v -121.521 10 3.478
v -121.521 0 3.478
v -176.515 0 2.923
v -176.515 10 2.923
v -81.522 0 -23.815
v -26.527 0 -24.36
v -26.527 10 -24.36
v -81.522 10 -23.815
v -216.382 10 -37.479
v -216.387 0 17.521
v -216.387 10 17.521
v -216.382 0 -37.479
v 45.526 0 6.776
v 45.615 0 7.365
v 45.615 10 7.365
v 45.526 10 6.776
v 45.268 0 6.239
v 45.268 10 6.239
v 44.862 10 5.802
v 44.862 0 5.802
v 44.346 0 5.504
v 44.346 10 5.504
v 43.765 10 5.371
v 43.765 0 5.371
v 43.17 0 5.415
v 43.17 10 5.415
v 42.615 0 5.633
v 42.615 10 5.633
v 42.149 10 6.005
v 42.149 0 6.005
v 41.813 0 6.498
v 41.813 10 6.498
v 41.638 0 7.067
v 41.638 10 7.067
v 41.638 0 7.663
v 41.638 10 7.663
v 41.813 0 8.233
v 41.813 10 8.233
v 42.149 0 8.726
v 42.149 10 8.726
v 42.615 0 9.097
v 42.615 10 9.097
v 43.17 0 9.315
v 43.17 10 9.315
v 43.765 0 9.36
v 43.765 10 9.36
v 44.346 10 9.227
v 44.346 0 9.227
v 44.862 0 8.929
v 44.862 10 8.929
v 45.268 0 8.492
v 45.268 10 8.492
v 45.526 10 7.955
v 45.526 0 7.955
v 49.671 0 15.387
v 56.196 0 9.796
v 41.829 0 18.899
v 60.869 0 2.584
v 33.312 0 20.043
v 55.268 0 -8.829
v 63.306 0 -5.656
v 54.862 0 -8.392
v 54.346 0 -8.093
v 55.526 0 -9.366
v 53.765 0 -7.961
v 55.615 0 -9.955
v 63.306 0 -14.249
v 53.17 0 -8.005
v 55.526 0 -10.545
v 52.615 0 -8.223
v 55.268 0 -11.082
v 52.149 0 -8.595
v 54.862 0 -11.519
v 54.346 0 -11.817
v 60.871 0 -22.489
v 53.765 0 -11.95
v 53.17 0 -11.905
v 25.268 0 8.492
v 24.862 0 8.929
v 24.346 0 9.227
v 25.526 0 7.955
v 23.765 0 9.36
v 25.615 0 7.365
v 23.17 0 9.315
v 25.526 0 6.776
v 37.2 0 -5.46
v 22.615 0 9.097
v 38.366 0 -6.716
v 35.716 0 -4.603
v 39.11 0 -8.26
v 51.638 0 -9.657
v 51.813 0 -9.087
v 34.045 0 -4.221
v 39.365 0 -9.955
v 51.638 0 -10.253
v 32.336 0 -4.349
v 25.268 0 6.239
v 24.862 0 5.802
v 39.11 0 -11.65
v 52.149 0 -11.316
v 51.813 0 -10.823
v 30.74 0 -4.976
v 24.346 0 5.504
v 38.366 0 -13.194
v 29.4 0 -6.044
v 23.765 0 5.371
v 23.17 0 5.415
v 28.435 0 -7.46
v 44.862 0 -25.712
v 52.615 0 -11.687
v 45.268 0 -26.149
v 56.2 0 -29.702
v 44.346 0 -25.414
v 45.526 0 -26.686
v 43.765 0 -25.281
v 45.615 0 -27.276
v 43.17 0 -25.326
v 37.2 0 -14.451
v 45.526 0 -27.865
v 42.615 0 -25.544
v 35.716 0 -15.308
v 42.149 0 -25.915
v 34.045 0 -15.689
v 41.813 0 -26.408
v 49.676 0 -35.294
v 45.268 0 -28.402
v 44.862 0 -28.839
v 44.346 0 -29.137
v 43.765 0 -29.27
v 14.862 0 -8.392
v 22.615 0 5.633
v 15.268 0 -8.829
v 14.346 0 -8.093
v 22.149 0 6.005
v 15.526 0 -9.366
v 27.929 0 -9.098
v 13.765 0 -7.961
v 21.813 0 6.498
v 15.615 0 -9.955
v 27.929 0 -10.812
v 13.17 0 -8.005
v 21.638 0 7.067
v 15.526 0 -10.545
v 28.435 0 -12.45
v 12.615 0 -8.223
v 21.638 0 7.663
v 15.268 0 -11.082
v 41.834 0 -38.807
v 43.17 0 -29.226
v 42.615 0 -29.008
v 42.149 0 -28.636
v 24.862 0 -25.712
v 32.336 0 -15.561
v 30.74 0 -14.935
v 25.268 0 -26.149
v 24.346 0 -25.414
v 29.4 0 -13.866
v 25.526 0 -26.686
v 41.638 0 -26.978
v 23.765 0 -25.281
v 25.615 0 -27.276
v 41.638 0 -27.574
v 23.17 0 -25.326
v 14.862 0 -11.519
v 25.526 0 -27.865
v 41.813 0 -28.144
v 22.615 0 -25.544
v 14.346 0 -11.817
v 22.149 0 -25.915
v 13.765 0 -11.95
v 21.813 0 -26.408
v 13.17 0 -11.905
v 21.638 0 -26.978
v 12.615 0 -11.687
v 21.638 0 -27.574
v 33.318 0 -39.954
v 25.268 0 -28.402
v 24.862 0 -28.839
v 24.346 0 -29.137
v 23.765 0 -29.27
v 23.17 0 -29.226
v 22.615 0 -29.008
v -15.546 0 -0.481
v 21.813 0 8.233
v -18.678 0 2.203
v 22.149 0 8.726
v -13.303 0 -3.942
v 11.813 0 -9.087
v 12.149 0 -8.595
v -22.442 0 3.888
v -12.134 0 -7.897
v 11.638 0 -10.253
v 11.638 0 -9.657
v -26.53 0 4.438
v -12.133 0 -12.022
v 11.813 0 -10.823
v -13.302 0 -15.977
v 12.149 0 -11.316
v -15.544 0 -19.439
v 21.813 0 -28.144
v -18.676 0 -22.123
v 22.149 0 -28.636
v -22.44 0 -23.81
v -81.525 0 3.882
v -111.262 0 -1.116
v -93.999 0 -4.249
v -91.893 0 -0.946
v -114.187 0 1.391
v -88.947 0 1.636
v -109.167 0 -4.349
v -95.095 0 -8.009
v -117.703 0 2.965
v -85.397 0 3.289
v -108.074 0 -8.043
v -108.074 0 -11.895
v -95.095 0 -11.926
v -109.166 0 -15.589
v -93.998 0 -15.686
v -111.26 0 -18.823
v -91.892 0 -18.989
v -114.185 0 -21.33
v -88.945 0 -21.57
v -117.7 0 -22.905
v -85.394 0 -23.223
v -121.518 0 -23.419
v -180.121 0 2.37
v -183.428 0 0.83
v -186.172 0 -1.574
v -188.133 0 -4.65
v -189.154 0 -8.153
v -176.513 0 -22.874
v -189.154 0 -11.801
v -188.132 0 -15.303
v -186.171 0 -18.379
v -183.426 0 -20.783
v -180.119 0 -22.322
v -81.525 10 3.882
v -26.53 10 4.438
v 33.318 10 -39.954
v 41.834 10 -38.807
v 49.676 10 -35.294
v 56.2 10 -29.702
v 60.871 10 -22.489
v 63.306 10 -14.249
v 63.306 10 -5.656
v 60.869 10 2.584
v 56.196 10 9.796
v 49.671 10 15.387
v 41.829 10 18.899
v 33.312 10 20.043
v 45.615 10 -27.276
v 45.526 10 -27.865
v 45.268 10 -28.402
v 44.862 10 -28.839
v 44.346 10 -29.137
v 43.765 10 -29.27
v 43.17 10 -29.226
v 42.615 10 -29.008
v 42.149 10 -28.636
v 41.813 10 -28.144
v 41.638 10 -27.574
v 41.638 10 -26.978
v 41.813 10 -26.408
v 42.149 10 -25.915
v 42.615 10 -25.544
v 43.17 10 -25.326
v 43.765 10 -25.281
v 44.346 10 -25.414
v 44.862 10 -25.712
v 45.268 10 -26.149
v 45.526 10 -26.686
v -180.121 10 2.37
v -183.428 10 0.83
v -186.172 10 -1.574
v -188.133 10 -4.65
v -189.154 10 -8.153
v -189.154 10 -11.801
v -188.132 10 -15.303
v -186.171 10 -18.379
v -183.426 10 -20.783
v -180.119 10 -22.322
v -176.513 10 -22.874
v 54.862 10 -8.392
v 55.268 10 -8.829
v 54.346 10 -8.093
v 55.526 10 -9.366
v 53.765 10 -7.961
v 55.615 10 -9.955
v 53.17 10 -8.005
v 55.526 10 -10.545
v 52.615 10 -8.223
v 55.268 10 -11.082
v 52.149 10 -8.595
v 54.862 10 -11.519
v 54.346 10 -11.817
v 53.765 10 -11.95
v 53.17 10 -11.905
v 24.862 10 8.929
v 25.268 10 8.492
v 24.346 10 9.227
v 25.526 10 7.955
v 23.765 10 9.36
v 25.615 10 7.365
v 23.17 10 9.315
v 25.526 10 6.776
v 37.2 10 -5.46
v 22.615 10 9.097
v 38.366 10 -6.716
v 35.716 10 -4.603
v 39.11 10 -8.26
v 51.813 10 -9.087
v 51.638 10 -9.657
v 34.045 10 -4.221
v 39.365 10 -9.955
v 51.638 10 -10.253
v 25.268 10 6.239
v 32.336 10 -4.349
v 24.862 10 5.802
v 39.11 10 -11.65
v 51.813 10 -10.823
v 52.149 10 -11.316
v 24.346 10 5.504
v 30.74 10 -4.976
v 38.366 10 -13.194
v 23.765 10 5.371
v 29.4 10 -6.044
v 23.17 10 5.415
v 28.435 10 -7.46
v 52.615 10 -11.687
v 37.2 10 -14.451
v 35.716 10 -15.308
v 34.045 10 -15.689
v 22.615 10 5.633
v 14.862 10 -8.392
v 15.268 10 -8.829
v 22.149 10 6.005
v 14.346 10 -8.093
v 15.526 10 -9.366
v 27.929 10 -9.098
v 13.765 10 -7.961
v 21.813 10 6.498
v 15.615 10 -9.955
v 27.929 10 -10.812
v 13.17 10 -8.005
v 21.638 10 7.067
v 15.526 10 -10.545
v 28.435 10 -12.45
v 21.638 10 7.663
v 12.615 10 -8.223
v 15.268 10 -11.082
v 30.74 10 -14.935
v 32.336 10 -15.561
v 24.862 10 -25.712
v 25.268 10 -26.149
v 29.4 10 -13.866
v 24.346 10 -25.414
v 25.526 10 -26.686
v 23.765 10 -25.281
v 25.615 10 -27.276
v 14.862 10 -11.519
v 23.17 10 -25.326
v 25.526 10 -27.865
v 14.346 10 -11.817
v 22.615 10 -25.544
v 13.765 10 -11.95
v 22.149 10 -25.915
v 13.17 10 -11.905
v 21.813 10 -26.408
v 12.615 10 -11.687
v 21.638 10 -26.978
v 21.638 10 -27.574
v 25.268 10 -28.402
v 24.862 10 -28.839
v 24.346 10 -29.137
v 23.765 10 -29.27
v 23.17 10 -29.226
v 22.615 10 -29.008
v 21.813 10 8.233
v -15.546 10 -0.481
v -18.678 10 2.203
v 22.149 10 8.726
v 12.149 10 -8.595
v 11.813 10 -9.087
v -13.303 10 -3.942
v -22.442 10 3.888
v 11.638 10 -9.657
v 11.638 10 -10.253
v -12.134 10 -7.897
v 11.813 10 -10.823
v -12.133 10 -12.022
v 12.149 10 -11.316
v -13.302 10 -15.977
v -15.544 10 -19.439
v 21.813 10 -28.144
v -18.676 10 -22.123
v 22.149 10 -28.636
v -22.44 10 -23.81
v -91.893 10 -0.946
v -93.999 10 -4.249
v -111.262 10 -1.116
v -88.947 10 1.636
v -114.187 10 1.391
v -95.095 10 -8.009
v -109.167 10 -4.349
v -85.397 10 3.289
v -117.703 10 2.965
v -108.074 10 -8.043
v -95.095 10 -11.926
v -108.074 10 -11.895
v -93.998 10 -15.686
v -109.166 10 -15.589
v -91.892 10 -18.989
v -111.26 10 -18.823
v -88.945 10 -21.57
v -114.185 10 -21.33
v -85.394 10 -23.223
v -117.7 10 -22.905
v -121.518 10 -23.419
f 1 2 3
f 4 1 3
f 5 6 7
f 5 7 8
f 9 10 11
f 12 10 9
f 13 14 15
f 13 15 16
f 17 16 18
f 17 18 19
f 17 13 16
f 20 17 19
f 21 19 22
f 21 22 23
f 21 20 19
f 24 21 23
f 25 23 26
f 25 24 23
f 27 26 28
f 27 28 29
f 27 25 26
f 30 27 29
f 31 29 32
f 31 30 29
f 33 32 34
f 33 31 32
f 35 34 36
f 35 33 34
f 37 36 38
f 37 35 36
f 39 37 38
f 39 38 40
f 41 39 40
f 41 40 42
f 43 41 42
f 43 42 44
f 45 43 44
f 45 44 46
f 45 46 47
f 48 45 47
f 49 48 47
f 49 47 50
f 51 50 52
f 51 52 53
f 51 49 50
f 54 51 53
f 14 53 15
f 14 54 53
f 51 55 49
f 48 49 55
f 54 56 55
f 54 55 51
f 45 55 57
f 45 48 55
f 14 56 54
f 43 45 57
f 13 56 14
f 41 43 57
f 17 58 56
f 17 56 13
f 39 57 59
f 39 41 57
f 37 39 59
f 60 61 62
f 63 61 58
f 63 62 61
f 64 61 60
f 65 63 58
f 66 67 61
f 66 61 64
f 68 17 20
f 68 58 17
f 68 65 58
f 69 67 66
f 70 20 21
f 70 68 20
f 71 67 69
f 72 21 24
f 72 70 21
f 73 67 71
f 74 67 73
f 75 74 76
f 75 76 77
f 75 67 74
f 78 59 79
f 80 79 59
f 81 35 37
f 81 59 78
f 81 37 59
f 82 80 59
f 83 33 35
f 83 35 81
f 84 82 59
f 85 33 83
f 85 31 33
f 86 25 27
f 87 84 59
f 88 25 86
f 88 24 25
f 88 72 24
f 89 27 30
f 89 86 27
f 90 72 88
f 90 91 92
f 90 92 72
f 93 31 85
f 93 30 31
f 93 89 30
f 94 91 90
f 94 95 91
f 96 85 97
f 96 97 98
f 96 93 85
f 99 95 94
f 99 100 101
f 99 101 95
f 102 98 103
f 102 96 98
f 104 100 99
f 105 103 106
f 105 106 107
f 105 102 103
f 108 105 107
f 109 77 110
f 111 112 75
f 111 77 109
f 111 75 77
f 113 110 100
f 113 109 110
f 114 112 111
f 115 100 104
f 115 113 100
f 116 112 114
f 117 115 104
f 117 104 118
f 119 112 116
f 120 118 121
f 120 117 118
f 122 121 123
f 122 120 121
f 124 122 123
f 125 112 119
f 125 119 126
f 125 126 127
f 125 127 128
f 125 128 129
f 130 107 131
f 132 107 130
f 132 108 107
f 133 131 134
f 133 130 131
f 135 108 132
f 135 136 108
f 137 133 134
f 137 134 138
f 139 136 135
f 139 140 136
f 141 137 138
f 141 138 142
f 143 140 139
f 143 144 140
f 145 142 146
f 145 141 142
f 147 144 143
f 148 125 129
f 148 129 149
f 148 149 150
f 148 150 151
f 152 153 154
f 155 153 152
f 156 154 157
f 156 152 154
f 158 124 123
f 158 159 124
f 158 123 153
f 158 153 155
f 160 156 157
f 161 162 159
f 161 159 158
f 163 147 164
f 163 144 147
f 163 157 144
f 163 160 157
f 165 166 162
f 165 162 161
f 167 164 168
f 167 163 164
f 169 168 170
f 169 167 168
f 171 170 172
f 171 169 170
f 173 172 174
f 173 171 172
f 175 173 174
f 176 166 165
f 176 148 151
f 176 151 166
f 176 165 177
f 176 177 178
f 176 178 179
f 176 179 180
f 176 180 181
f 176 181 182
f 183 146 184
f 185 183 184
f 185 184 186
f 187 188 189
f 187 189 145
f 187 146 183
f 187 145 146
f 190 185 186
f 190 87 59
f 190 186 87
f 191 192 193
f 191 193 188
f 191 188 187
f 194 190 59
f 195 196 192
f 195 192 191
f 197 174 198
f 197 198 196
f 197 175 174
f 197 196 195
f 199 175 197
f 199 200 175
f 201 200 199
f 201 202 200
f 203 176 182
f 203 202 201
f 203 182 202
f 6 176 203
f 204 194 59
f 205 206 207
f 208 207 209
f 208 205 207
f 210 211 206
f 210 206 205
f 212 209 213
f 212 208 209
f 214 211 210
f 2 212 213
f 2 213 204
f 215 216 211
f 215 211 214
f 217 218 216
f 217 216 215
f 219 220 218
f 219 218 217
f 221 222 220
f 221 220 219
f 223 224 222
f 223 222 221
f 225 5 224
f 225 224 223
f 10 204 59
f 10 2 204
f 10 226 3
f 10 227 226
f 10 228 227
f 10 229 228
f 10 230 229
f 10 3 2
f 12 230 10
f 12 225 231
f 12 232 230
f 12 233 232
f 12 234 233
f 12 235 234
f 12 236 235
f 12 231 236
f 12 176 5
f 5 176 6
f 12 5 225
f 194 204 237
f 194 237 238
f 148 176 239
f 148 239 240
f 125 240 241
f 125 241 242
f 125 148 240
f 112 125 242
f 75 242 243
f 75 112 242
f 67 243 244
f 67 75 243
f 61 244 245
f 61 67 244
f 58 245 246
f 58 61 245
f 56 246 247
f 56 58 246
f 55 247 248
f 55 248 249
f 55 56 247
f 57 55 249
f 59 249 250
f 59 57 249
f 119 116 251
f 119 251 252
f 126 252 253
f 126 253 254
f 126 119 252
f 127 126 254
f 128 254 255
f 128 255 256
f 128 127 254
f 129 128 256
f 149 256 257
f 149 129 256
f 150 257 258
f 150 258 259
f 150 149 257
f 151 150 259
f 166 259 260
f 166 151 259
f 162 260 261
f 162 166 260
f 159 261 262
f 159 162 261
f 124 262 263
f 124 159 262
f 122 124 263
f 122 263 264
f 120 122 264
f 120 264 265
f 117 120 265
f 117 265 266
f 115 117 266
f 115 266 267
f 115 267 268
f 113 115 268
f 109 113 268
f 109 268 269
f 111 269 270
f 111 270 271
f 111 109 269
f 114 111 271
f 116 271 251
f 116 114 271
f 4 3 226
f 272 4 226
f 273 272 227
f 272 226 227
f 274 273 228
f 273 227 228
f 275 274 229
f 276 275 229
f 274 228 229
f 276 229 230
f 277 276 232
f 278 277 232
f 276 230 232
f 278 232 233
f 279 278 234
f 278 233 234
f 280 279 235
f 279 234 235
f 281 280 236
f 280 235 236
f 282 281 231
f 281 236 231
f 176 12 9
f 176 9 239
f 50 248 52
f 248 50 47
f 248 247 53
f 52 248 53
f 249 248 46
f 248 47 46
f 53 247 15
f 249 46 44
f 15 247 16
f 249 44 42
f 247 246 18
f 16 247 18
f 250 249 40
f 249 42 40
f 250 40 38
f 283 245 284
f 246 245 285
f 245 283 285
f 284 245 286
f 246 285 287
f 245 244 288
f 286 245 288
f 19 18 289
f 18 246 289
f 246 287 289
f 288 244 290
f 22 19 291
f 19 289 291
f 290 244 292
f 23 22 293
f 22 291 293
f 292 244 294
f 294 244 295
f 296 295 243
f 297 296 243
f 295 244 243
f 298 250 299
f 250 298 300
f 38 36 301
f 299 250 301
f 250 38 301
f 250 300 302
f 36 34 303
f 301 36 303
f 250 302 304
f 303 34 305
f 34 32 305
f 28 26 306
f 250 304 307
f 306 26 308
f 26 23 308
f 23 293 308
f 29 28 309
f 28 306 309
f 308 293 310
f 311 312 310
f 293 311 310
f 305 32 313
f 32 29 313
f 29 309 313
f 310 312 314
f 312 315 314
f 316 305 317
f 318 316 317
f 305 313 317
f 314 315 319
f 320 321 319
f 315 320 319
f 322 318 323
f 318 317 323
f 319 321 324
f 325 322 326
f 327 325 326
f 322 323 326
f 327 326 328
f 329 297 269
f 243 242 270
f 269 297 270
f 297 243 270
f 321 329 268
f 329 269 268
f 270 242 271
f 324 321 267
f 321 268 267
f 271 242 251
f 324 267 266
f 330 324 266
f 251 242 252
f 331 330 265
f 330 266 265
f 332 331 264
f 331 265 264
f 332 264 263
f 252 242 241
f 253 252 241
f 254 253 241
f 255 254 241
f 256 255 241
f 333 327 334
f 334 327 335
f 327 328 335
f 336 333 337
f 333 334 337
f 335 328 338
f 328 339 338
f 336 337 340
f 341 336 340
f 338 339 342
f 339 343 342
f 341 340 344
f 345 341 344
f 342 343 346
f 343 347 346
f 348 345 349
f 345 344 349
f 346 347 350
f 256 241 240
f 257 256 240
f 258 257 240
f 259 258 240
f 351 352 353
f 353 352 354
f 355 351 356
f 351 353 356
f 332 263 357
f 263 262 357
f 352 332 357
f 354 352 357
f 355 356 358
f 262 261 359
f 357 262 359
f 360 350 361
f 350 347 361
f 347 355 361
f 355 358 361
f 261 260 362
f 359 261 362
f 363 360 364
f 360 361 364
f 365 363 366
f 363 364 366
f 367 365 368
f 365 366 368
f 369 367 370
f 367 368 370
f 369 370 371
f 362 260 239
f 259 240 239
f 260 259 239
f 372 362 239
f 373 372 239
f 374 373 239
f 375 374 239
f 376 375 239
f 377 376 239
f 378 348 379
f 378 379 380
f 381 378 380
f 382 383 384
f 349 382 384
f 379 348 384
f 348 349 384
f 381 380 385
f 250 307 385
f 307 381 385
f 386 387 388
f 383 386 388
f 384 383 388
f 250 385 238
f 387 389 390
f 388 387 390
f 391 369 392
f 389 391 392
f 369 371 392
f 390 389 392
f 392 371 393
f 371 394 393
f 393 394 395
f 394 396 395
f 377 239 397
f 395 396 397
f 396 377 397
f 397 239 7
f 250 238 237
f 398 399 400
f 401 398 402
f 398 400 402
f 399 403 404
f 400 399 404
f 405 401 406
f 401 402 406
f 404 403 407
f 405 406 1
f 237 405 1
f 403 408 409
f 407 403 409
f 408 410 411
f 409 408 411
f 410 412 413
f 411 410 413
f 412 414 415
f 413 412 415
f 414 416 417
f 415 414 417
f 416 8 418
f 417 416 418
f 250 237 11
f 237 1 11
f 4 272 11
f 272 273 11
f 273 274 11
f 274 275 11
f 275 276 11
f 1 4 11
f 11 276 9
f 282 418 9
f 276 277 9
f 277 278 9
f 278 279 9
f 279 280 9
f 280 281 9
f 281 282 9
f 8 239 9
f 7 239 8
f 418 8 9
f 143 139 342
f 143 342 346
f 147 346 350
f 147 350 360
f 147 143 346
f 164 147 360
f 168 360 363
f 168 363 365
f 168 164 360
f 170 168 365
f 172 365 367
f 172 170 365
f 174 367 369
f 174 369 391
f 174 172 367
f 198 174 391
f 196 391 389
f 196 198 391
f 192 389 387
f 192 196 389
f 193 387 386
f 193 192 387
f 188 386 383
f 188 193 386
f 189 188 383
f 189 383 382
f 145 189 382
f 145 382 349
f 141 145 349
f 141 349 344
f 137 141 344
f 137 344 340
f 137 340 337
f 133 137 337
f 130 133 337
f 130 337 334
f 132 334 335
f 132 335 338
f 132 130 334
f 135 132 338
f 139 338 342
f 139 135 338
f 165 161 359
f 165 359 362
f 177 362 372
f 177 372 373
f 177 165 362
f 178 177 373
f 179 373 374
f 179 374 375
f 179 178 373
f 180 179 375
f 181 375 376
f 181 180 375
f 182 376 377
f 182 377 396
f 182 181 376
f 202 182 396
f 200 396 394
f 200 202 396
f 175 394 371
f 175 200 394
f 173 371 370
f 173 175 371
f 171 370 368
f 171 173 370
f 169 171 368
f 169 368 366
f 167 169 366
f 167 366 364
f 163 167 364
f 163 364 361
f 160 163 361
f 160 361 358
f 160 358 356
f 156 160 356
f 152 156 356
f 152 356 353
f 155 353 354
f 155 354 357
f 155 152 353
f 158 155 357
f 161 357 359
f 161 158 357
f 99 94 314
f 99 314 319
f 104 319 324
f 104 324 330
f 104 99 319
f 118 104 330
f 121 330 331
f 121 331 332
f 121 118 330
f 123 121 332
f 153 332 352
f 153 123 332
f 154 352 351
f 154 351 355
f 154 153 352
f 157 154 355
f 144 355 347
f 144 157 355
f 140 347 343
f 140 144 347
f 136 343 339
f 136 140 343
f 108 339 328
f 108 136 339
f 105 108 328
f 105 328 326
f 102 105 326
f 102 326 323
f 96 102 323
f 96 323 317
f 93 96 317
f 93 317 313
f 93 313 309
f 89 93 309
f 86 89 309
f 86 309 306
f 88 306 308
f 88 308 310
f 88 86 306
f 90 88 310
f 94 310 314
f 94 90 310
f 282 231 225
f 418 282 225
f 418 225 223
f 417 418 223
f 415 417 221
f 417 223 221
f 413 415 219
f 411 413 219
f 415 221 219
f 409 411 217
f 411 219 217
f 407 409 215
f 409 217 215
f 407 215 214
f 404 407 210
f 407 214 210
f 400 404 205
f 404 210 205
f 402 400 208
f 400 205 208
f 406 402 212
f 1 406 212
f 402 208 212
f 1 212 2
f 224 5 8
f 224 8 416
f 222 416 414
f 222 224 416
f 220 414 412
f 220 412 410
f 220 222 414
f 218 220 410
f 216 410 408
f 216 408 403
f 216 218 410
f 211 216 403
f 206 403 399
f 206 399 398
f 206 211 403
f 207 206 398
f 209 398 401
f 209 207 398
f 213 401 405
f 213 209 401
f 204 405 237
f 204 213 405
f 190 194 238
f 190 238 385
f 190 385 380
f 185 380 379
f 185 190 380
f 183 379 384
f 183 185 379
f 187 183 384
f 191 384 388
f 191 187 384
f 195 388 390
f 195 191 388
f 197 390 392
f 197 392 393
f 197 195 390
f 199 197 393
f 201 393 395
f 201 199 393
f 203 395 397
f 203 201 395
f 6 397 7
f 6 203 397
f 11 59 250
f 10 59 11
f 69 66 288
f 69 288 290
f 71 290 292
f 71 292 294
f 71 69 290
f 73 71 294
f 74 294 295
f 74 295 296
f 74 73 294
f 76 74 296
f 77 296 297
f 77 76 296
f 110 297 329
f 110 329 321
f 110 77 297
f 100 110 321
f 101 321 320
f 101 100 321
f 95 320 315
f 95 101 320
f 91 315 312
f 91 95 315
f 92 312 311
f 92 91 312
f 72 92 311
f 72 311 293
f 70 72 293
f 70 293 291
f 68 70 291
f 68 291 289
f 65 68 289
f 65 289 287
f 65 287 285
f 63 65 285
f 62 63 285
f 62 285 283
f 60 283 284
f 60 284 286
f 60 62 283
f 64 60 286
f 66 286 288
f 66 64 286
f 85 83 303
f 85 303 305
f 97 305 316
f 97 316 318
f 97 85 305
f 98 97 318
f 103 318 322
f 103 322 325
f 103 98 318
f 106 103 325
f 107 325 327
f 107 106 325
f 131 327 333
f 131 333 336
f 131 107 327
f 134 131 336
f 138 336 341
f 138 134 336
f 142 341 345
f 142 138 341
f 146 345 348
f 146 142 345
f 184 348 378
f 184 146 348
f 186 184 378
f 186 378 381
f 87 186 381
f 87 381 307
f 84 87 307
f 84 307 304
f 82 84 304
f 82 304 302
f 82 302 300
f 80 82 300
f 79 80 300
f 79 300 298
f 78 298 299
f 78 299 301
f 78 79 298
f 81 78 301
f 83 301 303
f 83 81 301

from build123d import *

# Parameters (mm, degrees)
SKETCH1_R           = 5.75
SKETCH1_R_2         = 2
BOSS_EXTRUDE1_DEPTH = 10


with BuildPart() as part:
    # Sketch1 → Boss-Extrude1 (new body)
    with BuildSketch(Plane(origin=(0, 0, 0), x_dir=(1, 0, 0), z_dir=(0, 1, 0))):
        with BuildLine():
            Line((-216.382104852, 37.479356926), (33.317969978, 39.953751753))
            ThreePointArc((33.317969978, 39.953751753), (63.615239274, 9.952328714), (33.312178481, -20.043244588))
            Line((33.312178481, -20.043244588), (-216.38741399, -17.520642817))
            Line((-216.38741399, -17.520642817), (-216.382104852, 37.479356926))
        make_face()
        with Locations((33.615239414, 9.955224607)):
            Circle(SKETCH1_R, mode=Mode.SUBTRACT)
        with Locations((53.615239414, 9.955224607)):
            Circle(SKETCH1_R_2, mode=Mode.SUBTRACT)
        with Locations((43.615239414, -7.365283468)):
            Circle(SKETCH1_R_2, mode=Mode.SUBTRACT)
        with Locations((23.615239414, -7.365283468)):
            Circle(SKETCH1_R_2, mode=Mode.SUBTRACT)
        with Locations((13.615239414, 9.955224607)):
            Circle(SKETCH1_R_2, mode=Mode.SUBTRACT)
        with Locations((23.615239414, 27.275732683)):
            Circle(SKETCH1_R_2, mode=Mode.SUBTRACT)
        with Locations((43.615239414, 27.275732683)):
            Circle(SKETCH1_R_2, mode=Mode.SUBTRACT)
        with BuildLine():
            Line((-176.512574007, 22.873706291), (-121.518027204, 23.418672976))
            ThreePointArc((-121.518027204, 23.418672976), (-107.935613387, 9.968888481), (-121.52062356, -3.478273548))
            Line((-121.52062356, -3.478273548), (-176.515064128, -2.922689649))
            ThreePointArc((-176.515064128, -2.922689649), (-189.283603246, 9.976740986), (-176.512574007, 22.873706291))
        make_face(mode=Mode.SUBTRACT)
        with BuildLine():
            Line((-81.524666784, -3.882334565), (-26.530226217, -4.437918464))
            ThreePointArc((-26.530226217, -4.437918464), (-11.985090745, 9.959626398), (-26.527446362, 24.359979069))
            Line((-26.527446362, 24.359979069), (-81.521993165, 23.815012384))
            ThreePointArc((-81.521993165, 23.815012384), (-95.234126773, 9.967662409), (-81.524666784, -3.882334565))
        make_face(mode=Mode.SUBTRACT)
    extrude(amount=BOSS_EXTRUDE1_DEPTH)


solid = part.part
